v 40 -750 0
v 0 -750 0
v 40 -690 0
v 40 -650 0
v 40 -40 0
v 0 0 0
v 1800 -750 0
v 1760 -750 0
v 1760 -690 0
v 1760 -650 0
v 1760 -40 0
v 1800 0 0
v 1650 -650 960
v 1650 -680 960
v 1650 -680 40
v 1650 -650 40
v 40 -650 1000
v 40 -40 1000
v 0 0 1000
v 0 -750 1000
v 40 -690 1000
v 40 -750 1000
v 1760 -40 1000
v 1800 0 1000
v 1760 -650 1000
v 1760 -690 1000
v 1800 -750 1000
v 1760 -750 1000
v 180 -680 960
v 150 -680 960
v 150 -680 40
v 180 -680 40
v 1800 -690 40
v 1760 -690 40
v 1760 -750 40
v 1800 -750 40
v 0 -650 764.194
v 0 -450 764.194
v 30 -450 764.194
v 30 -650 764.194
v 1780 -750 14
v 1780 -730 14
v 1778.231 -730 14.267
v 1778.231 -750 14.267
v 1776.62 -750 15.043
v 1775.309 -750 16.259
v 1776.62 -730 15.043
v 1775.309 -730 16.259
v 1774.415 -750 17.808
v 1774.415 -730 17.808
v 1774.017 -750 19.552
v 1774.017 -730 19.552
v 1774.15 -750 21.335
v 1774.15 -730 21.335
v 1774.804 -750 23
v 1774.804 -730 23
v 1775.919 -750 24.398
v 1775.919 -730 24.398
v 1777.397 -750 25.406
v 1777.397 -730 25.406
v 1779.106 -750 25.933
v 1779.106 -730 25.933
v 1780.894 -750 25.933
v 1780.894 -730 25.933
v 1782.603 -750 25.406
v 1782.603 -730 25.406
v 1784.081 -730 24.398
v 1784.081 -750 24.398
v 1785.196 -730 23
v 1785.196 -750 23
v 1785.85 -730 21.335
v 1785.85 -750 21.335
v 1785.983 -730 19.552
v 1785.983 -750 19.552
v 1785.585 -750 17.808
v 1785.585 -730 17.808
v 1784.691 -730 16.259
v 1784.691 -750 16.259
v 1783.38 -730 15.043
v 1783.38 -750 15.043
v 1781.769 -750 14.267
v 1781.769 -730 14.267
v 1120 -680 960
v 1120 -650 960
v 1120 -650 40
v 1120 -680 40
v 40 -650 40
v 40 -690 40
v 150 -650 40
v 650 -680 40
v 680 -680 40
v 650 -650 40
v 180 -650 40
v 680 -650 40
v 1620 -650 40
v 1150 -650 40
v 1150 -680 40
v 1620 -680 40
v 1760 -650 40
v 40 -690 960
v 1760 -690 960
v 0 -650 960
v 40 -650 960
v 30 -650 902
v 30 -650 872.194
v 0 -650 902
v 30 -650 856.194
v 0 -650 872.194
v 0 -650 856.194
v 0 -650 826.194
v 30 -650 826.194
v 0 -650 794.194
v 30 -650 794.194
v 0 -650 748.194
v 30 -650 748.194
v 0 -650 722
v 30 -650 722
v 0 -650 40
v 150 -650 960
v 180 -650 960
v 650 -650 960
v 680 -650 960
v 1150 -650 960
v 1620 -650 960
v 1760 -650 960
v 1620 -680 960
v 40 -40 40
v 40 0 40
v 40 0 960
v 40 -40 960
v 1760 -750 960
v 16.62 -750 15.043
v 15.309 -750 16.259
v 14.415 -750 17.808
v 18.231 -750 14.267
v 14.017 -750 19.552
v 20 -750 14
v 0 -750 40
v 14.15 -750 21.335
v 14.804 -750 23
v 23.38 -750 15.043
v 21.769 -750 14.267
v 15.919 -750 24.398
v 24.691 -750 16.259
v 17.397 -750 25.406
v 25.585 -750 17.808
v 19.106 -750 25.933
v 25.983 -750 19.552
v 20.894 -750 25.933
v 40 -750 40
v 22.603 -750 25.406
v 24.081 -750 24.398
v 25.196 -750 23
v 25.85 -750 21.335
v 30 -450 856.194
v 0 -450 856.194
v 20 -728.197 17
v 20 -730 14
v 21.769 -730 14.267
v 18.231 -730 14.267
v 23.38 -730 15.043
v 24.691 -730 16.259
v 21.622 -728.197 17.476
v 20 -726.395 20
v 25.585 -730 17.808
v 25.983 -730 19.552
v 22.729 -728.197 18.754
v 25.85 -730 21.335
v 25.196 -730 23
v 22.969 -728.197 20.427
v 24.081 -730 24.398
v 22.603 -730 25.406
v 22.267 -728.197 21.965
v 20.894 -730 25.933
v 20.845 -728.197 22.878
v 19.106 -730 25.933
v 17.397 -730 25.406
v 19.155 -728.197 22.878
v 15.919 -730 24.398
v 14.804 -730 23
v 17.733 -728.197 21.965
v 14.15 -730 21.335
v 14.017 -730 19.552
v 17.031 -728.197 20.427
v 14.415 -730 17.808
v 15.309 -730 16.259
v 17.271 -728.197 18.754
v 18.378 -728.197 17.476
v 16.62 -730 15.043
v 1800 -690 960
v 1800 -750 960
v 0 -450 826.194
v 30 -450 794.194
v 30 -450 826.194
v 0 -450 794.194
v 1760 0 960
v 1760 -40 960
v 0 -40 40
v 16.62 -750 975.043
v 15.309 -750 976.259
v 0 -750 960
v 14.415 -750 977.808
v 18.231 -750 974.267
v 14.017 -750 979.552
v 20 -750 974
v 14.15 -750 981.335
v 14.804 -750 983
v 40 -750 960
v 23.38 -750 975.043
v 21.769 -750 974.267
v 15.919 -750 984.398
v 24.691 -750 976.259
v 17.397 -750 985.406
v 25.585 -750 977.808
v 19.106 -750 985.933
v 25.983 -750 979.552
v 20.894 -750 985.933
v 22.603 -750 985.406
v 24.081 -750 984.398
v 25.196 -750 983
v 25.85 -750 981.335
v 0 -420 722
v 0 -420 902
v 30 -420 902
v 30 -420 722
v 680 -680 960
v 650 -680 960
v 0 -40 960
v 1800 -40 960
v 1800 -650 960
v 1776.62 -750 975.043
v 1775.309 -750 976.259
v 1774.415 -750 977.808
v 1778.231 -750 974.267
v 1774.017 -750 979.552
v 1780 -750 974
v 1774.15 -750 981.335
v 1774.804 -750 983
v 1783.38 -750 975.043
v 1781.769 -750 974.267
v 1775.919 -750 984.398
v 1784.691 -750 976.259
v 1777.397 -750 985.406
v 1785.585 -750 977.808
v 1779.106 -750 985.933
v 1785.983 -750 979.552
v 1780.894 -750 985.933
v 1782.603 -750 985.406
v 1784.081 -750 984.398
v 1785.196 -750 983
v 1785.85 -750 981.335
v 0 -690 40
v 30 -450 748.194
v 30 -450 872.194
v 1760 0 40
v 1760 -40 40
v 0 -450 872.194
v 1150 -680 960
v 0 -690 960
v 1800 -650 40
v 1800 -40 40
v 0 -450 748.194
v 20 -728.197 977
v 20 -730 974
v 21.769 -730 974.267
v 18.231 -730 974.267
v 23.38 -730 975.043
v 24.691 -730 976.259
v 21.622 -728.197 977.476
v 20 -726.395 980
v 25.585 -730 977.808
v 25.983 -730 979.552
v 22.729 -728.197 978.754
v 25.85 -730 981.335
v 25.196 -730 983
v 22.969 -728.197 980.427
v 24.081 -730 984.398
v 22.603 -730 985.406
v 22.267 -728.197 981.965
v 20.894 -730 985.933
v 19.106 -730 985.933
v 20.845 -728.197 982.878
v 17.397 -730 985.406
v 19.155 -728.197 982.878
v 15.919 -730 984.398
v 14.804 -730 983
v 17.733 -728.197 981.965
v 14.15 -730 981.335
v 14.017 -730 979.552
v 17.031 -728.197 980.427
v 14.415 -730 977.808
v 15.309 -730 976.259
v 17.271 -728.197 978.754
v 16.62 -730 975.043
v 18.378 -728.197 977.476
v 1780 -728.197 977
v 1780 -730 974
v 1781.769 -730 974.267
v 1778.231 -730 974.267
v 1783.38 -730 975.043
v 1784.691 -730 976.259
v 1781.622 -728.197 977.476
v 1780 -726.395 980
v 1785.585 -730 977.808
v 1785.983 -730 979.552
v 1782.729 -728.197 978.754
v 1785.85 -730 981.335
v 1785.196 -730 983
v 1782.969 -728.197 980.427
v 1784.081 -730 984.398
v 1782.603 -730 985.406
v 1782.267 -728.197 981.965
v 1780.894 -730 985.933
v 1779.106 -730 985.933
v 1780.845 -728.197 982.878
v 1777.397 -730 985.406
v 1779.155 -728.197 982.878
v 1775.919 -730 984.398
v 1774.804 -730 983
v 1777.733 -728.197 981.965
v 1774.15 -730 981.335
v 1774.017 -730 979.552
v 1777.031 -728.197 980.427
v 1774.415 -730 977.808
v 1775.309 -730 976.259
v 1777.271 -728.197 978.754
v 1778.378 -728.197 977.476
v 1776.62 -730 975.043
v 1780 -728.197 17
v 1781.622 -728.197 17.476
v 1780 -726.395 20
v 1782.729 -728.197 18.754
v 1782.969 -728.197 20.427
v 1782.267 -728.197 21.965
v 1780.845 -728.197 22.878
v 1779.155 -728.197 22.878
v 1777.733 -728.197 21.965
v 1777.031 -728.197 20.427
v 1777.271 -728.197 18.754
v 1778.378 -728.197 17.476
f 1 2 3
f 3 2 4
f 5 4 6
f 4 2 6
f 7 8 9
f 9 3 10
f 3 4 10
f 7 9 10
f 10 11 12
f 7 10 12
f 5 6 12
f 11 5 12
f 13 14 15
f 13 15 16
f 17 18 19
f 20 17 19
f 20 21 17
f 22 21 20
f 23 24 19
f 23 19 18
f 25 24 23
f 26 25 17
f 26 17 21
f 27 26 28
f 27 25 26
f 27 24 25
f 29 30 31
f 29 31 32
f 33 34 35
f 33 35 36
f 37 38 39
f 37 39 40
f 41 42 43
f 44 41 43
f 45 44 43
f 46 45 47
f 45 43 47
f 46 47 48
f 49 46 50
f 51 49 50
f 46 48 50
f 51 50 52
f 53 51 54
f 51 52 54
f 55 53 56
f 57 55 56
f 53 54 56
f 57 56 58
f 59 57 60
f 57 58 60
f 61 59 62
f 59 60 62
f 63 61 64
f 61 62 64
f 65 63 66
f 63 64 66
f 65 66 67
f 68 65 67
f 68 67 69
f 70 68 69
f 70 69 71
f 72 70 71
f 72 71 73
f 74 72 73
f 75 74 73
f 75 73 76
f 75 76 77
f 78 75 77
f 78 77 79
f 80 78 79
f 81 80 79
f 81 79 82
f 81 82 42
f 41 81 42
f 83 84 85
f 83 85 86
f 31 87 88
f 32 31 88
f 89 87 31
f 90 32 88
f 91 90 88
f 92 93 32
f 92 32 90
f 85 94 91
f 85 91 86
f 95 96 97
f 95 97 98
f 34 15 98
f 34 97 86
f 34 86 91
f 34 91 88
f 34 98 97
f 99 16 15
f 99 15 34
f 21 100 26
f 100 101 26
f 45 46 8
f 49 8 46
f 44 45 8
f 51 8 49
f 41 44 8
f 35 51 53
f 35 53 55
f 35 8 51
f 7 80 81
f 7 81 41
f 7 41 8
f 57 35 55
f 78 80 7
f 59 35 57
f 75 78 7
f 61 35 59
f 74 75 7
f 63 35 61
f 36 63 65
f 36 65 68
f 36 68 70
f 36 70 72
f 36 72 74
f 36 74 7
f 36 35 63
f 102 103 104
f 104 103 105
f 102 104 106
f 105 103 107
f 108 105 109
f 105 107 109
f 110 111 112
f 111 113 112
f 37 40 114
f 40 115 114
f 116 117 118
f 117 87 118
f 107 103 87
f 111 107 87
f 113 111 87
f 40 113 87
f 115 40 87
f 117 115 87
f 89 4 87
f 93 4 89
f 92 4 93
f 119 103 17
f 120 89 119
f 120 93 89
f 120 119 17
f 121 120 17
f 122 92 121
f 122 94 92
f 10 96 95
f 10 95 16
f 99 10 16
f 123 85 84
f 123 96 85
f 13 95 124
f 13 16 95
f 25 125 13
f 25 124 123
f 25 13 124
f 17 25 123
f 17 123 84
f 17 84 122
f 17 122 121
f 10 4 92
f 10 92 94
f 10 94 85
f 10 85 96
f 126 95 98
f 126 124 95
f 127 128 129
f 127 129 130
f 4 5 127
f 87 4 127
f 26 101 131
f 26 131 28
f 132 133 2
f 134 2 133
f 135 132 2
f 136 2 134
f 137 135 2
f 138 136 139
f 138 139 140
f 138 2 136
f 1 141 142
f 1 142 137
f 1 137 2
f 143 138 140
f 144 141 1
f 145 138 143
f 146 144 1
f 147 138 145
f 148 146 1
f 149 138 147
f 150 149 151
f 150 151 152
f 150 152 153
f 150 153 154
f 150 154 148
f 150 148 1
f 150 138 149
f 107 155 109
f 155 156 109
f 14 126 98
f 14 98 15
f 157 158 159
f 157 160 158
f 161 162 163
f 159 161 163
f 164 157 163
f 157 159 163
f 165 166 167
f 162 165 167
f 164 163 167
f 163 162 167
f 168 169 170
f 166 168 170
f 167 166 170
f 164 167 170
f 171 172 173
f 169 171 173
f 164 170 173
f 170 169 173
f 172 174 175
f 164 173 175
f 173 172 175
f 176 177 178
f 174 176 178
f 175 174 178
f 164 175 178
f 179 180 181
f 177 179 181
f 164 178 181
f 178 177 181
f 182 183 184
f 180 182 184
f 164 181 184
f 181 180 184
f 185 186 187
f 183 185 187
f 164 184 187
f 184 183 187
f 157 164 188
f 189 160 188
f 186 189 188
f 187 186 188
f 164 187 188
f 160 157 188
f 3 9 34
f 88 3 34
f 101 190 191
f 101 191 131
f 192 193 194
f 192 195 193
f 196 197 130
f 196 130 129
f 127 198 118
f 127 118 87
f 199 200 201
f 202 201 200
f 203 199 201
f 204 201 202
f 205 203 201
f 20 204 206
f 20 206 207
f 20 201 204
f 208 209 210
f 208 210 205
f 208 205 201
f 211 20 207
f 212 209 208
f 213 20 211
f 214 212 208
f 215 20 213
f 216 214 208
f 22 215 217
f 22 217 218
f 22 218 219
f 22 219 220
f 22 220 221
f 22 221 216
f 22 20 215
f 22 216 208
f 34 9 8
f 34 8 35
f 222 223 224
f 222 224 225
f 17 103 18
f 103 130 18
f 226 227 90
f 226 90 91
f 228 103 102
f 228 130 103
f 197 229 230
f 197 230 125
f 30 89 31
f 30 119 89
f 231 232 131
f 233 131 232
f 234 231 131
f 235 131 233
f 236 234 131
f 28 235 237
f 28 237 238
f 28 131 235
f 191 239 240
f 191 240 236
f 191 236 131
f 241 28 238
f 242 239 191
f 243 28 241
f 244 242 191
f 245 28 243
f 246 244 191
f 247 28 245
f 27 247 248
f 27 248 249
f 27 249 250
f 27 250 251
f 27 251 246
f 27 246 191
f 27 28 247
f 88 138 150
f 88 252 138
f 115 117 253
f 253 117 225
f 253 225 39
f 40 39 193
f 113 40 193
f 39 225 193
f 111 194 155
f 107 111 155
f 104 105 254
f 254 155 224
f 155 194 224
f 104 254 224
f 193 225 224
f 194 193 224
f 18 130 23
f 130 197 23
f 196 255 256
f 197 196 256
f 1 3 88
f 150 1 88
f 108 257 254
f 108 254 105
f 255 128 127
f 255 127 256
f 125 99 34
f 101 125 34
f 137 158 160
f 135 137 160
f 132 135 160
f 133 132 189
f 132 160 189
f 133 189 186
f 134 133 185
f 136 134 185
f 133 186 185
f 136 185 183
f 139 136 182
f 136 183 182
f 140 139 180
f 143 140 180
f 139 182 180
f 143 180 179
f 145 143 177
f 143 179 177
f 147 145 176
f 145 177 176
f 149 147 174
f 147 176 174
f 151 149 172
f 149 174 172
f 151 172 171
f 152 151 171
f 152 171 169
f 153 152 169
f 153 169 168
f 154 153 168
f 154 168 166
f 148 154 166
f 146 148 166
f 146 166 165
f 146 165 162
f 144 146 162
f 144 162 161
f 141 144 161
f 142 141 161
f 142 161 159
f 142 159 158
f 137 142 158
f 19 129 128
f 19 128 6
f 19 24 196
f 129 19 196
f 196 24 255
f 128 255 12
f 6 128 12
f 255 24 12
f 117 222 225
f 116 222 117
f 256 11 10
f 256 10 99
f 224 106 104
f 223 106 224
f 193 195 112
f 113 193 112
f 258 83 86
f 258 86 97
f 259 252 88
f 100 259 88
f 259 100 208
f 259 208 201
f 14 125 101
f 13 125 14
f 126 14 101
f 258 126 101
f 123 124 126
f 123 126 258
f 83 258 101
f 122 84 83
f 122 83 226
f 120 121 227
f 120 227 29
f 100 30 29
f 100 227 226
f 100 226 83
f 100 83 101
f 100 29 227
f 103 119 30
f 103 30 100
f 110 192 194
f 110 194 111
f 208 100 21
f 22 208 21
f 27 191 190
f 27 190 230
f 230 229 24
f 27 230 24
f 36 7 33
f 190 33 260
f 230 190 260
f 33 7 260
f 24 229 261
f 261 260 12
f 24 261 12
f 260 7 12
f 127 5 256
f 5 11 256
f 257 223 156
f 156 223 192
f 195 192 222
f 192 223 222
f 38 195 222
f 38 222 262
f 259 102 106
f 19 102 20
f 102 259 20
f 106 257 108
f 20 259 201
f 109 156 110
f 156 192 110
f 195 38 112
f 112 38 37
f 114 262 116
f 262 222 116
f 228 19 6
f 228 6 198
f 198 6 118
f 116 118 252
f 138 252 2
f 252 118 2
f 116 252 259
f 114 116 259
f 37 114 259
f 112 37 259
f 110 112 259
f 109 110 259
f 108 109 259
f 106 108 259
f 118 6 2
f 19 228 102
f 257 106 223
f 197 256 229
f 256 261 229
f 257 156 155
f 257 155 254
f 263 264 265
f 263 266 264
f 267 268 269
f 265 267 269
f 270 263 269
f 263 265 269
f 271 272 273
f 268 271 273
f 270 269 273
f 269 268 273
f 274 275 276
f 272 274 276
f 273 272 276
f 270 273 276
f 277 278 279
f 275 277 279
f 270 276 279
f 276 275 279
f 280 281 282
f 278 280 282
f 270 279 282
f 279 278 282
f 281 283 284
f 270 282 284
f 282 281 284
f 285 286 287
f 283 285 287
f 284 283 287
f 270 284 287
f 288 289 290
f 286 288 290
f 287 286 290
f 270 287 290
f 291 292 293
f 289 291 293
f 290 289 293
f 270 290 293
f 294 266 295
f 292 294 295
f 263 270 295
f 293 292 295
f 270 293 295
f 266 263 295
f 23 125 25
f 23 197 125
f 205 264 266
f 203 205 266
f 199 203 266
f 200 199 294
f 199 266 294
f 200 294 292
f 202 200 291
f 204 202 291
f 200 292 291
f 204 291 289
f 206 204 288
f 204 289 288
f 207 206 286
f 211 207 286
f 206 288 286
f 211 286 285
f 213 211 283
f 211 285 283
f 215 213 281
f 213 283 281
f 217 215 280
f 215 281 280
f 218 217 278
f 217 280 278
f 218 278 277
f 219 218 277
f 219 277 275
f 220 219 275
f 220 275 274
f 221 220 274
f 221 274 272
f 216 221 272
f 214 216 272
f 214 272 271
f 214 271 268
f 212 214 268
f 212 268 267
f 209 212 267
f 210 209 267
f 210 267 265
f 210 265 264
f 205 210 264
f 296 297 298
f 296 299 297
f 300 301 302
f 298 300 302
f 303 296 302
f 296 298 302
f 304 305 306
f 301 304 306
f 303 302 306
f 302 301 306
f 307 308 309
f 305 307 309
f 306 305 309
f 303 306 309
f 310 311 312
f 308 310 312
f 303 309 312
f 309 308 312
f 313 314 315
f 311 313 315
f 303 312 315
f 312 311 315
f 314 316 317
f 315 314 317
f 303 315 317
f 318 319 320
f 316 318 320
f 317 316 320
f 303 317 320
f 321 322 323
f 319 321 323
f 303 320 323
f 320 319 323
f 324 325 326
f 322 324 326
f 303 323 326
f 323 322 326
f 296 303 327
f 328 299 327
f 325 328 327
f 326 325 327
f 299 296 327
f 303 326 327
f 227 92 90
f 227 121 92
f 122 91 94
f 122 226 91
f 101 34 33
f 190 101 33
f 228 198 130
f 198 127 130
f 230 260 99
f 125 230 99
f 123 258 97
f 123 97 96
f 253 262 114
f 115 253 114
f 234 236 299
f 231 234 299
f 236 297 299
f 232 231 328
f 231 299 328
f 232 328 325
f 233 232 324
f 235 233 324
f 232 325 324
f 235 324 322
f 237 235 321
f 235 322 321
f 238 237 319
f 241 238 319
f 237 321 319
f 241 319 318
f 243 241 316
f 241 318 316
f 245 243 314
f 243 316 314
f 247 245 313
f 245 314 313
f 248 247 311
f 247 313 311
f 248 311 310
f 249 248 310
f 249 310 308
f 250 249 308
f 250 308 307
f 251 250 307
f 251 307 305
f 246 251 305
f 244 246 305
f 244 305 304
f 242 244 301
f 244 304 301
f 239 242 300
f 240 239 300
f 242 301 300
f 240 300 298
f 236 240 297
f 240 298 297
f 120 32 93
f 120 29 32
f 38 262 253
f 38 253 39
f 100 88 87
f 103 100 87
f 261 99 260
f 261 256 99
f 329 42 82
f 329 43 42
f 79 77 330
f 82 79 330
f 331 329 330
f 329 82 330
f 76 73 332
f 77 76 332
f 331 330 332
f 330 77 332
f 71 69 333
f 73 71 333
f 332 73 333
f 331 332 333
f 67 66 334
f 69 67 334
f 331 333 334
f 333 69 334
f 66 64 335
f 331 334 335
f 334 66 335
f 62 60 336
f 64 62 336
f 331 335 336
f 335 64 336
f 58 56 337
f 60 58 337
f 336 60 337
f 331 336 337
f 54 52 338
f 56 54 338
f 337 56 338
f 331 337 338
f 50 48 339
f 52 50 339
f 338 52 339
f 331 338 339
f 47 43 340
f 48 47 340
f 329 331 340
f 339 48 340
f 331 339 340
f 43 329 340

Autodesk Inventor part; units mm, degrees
ref_plane "YZ Plane" through (0, 0, 0) normal (1, 0, 0) x (0, 1, 0)
ref_plane "XZ Plane" through (0, 0, 0) normal (0, 1, 0) x (-1, 0, 0)
ref_plane "XY Plane" through (0, 0, 0) normal (0, 0, 1) x (1, 0, 0)
sketch "Sketch1" plane through (0, 0, 0) normal (0, 0, 1) x (1, 0, 0)
  line L0 (0, 0) -> (1800, 0)
  line L1 (0, 0) -> (0, -40)
  line L2 (0, -40) -> (1800, -40)
  line L3 (1800, -40) -> (1800, 0)
  dimension "d0" = 1800
  dimension "d1" = 40
extrude "Extrusion1" add sketch "Sketch1" along normal blind 40
sketch "Sketch2" plane through (0, 0, 40) normal (0, 0, 1) x (1, 0, 0)
  line L0 (0, 0) -> (0, -40) projected
  line L1 (1800, 0) -> (0, 0) projected
  line L2 (0, 0) -> (40, 0)
  line L3 (0, -40) -> (1800, -40) projected
  line L4 (40, -40) -> (0, -40)
  line L5 (0, -40) -> (0, 0)
  line L6 (40, 0) -> (40, -40)
  line L7 (1800, -40) -> (1800, 0) projected
  line L8 (1800, 0) -> (1760, 0)
  line L9 (1760, -40) -> (1800, -40)
  line L10 (1760, 0) -> (1760, -40)
  line L11 (1800, 0) -> (1800, -40)
  dimension "d5" = 40
  dimension "d6" = 40
extrude "Extrusion2" add sketch "Sketch2" along normal blind 960 contours L1 L6 L3 L0 | L1 L7 L3 L10
sketch "Sketch4" plane through (1760, -40, 40) normal (-1, 0, 0) x (0, 0, 1)
  line L0 (960, 40) -> (960, 0) projected
  line L1 (960, 40) -> (920, 40)
  line L2 (0, 40) -> (960, 40) projected
  line L3 (0, 0) -> (960, 0) projected
  line L4 (920, 0) -> (920, 40)
  line L5 (920, 0) -> (960, 0)
  line L6 (960, 0) -> (960, 40)
  point P0 (-40, 40)
  dimension "d9" = 40
extrude "Extrusion3" add sketch "Sketch4" along normal up to surface (1720 mm away)
sketch "Sketch5" plane through (0, -40, 0) normal (0, -1, 0) x (1, 0, 0)
  line L0 (40, 40) -> (40, 960) projected
  line L1 (40, 960) -> (40, 1000)
  line L2 (1800, 1000) -> (0, 1000) projected
  line L3 (0, 1000) -> (0, 960)
  line L4 (0, 0) -> (0, 1000) projected
  line L5 (40, 960) -> (0, 960)
  line L6 (0, 1000) -> (40, 1000)
  line L7 (1760, 40) -> (1760, 960) projected
  line L8 (1760, 960) -> (1800, 960)
  line L9 (1800, 0) -> (1800, 1000) projected
  line L10 (1760, 960) -> (1760, 1000)
  line L11 (1760, 1000) -> (1800, 1000)
  line L12 (1800, 1000) -> (1800, 960)
  line L13 (1760, 40) -> (40, 40) projected
  line L14 (1760, 40) -> (1800, 40)
  line L15 (1800, 40) -> (1800, 0)
  line L16 (1800, 0) -> (1760, 0)
  line L17 (1800, 0) -> (0, 0) projected
  line L18 (1760, 0) -> (1760, 40)
  line L19 (0, 40) -> (40, 40)
  line L20 (40, 0) -> (40, 40)
  line L21 (0, 40) -> (0, 0)
  line L22 (40, 0) -> (0, 0)
extrude "Extrusion4" add sketch "Sketch5" along normal blind 710 contours L20 L17 L4 L19 | L5 L3 L2 L1 | L14 L9 L16 L18 | L10 L2 L9 L8
sketch "Sketch6" plane through (1760, -40, 0) normal (-1, 0, 0) x (0, 0, 1)
  line L0 (0, 40) -> (0, -710) projected
  line L1 (0, -610) -> (40, -610)
  line L2 (40, 0) -> (40, -710) projected
  line L3 (0, -610) -> (0, -650)
  line L4 (0, -650) -> (40, -650)
  line L5 (40, -650) -> (40, -610)
  line L6 (0, 0) -> (40, 0) projected
  line L7 (960, 0) -> (960, -710) projected
  line L8 (960, -610) -> (1000, -610)
  line L9 (1000, 0) -> (1000, -710) projected
  line L10 (960, -650) -> (1000, -650)
  line L11 (1000, -650) -> (1000, -610)
  line L12 (960, -610) -> (960, -650)
  dimension "d14" = 40
  dimension "d15" = 650
extrude "Extrusion5" add sketch "Sketch6" along normal up to surface (1720 mm away) contours L1 L2 L4 L0 | L8 L9 L10 L7
sketch "Sketch7" plane through (0, -750, 40) normal (0, 0, 1) x (1, 0, 0)
  line L0 (40, 710) -> (40, 100) projected
  line L1 (40, 100) -> (0, 100)
  line L2 (0, 100) -> (0, 60)
  line L3 (40, 60) -> (40, 0) projected
  line L4 (0, 60) -> (40, 60)
  line L5 (40, 60) -> (40, 100)
  line L6 (1760, 60) -> (1760, 0) projected
  line L7 (1760, 60) -> (1800, 60)
  line L8 (1800, 710) -> (1800, 0) projected
  line L9 (1760, 710) -> (1760, 100) projected
  line L10 (1800, 100) -> (1760, 100)
  line L11 (1760, 100) -> (1760, 60)
  line L12 (0, 100) -> (0, 60)
  line L13 (0, 710) -> (0, 0) projected
  line L14 (1800, 100) -> (1800, 60)
  line L15 (0, 100) -> (0, 60)
  point P0 (0, 750)
extrude "Extrusion6" add sketch "Sketch7" along normal up to surface (920 mm away)
sketch "Sketch8" plane through (0, 0, 0) normal (-1, 0, 0) x (0, 0, 1)
  line L0 (40, -650) -> (960, -650) projected
  line L1 (902, -650) -> (902, -420)
  line L2 (902, -420) -> (722, -420)
  line L3 (722, -420) -> (722, -650)
  line L4 (960, -40) -> (960, -650) projected
  line L5 (722, -450) -> (902, -450)
  line L6 (722, -650) -> (902, -650)
  line L7 (764.1942, -450) -> (764.1942, -650)
  line L8 (794.1942, -450) -> (794.1942, -650)
  line L9 (826.1942, -450) -> (826.1942, -650)
  line L10 (856.1942, -450) -> (856.1942, -650)
  line L11 (872.1942, -450) -> (872.1942, -650)
  line L12 (748.1942, -450) -> (748.1942, -650)
  point P0 (0, 0)
  dimension "d20" = 230
  dimension "d21" = 58
  dimension "d22" = 180
  dimension "d23" = 30
  dimension "d24" = 30
  dimension "d25" = 30
  dimension "d26" = 32
  dimension "d27" = 16
  dimension "d28" = 16
extrude "Extrusion7" add sketch "Sketch8" against normal blind 30 contours L3 L5 L12 L0 | L3 L2 L1 L5 | L7 L5 L8 L0 | L9 L5 L10 L0 | L1 L0 L11 L5
sketch "Sketch9" plane through (1760, -690, 960) normal (0, 0, -1) x (-1, 0, 0)
  line L0 (0, 40) -> (1720, 40) projected
  line L1 (110, 40) -> (140, 40)
  line L2 (140, 40) -> (140, 10)
  line L3 (140, 10) -> (110, 10)
  line L4 (110, 10) -> (110, 40)
  line L5 (610, 40) -> (640, 40)
  line L6 (640, 40) -> (640, 10)
  line L7 (640, 10) -> (610, 10)
  line L8 (610, 10) -> (610, 40)
  line L9 (1080, 40) -> (1110, 40)
  line L10 (1110, 40) -> (1110, 10)
  line L11 (1110, 10) -> (1080, 10)
  line L12 (1080, 10) -> (1080, 40)
  line L13 (1580, 40) -> (1610, 40)
  line L14 (1610, 40) -> (1610, 10)
  line L15 (1610, 10) -> (1580, 10)
  line L16 (1580, 10) -> (1580, 40)
  line L17 (-40, -60) -> (-40, 690) projected
  line L18 (1760, 690) -> (1760, -60) projected
  point P0 (1610, 40)
  point P1 (1580, 40)
  point P2 (640, 40)
  point P3 (610, 40)
  dimension "d31" = 30
  dimension "d32" = 30
  dimension "d33" = 30
  dimension "d34" = 30
  dimension "d35" = 30
  dimension "d36" = 30
  dimension "d37" = 30
  dimension "d38" = 30
  dimension "d39" = 150
  dimension "d40" = 150
  dimension "d41" = 470
  dimension "d42" = 470
extrude "Extrusion8" add sketch "Sketch9" along normal up to surface (920 mm away)
sketch "Sketch24" plane through (0, -750, 0) normal (0, -1, 0) x (1, 0, 0)
  circle A0 centre (20, 20) radius 6
  line L0 (40, 40) -> (0, 40) projected
  line L1 (0, 40) -> (0, 0) projected
  point P0 (0, 20)
  dimension "d95" = 20
  dimension "d96" = 20
  dimension "d97" = 12
sketch "Sketch25" plane through (0, -750, 0) normal (0, -1, 0) x (1, 0, 0)
  circle A0 centre (20, 980) radius 6
  line L0 (40, 1000) -> (0, 1000) projected
  line L1 (0, 1000) -> (0, 960) projected
  circle A1 centre (1780, 980) radius 6
  circle A2 centre (1780, 20) radius 6
  line L2 (1760, 0) -> (1800, 0) projected
  line L3 (1800, 0) -> (1800, 40) projected
  point P0 (0, 0)
  dimension "d98" = 20
  dimension "d99" = 20
  dimension "d100" = 12
  dimension "d101" = 20
  dimension "d102" = 20
  dimension "d103" = 12
hole "Hole1" at (20, -750, 20) direction (0, 1, 0) diameter 12 depth 20 tip angle 118
hole "Hole2" at (20, -750, 980) at (1780, -750, 980) at (1780, -750, 20) direction (0, 1, 0) diameter 12 depth 20 tip angle 118
properties part number "BangTai"
